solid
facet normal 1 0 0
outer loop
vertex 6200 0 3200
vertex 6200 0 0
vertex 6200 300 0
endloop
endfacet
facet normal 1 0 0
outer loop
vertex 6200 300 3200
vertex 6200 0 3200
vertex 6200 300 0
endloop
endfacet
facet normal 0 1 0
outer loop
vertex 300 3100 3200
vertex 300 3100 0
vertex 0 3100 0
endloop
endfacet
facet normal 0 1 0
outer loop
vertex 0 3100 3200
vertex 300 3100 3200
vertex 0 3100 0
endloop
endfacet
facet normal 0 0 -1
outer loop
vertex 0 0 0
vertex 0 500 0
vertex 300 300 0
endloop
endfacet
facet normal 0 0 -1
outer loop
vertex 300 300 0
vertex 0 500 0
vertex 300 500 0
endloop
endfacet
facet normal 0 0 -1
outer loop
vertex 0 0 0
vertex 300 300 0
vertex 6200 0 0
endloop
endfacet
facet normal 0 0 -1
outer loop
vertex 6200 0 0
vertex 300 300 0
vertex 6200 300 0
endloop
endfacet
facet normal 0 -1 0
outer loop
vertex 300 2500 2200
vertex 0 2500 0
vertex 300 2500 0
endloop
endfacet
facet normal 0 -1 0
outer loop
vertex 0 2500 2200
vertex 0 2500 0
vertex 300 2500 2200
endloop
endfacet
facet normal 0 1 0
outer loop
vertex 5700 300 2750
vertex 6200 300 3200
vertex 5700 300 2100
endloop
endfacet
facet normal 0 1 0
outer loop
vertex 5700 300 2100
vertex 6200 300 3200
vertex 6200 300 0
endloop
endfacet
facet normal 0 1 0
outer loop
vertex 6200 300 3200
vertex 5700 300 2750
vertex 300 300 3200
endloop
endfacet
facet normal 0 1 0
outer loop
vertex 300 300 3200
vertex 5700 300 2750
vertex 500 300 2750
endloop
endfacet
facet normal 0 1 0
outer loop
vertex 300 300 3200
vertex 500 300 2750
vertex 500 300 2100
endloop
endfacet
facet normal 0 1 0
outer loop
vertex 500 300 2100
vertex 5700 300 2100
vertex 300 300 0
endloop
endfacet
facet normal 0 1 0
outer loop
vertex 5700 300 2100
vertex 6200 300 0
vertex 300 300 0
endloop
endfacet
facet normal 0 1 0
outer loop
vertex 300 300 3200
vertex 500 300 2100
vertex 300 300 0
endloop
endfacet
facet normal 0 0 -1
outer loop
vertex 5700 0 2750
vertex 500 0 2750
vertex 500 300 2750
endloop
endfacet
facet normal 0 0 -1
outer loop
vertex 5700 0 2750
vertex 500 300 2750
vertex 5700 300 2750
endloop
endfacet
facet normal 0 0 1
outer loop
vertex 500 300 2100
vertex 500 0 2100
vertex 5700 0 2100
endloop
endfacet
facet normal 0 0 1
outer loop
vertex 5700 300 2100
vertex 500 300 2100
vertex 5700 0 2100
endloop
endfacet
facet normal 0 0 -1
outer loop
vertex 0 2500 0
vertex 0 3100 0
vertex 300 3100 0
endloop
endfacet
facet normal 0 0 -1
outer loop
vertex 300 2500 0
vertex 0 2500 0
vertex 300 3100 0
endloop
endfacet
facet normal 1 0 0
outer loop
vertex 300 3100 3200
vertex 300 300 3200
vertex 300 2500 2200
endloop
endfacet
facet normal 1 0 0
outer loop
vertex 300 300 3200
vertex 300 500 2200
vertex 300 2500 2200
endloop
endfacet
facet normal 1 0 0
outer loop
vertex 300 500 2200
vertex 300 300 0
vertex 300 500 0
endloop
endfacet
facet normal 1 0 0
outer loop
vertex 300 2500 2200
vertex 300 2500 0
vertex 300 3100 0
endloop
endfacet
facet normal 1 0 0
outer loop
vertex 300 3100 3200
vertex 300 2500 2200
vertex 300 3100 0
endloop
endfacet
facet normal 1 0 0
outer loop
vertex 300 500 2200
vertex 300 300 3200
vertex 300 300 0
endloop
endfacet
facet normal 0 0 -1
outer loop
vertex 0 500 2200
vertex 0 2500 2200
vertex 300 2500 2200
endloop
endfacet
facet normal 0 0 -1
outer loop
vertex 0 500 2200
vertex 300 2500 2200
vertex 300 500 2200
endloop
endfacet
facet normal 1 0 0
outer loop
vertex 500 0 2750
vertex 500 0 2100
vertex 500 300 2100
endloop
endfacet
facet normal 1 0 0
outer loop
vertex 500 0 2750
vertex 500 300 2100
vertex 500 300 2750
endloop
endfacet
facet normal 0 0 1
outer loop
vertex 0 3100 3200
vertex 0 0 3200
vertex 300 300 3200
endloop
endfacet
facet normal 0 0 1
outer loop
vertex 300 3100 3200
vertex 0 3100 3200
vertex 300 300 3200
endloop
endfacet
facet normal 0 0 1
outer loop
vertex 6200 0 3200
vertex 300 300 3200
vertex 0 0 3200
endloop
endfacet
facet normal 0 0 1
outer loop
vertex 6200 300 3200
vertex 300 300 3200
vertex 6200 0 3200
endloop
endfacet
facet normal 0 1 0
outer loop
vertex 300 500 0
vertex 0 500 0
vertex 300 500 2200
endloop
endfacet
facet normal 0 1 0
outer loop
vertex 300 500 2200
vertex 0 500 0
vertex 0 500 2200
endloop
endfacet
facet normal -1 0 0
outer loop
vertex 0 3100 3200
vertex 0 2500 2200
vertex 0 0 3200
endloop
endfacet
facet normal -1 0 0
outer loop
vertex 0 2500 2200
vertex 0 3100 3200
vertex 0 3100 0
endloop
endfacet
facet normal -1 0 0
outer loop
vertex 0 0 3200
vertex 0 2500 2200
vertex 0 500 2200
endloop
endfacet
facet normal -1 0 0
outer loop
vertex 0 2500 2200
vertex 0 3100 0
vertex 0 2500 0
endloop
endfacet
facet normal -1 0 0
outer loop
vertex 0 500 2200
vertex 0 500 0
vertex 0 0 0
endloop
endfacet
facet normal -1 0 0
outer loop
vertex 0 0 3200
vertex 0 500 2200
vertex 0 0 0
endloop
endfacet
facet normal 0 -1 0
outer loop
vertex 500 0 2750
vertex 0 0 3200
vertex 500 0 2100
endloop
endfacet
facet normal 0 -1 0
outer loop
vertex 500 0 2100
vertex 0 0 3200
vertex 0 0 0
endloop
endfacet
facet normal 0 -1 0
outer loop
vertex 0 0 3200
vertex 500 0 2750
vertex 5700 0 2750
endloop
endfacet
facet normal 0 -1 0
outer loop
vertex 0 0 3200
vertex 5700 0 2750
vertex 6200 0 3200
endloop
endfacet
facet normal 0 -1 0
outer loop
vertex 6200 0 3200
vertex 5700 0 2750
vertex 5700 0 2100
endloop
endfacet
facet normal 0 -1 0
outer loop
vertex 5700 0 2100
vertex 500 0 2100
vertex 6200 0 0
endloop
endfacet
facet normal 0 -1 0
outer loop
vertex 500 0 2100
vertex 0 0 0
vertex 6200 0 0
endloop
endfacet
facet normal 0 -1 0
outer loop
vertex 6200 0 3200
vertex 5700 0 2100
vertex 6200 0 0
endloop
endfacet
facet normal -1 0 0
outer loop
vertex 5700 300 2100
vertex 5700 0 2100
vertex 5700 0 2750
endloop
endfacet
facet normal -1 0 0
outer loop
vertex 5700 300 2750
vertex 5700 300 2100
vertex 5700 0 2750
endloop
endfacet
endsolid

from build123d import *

# Parameters (mm, degrees)
F1_DEPTH = 3200
F2_W     = 2000
F2_H     = 2200
F3_DEPTH = 1000
F4_W     = 5200
F4_H     = 650
F5_DEPTH = 1000


with BuildPart() as f1:
    # F0 (on Top) → F1 (new body)
    with BuildSketch(Plane.XY):
        Polygon((0, 0), (6200, 0), (6200, 300), (300, 300), (300, 3100), (0, 3100), align=None)
    extrude(amount=F1_DEPTH)

    # F2 (on face) → F3 (cut)
    with BuildSketch(Plane(origin=(0, 0, 0), x_dir=(0, -1, 0), z_dir=(-1, 0, 0))):
        with Locations((-1500, 1100)):
            Rectangle(F2_W, F2_H)
    extrude(amount=-F3_DEPTH, mode=Mode.SUBTRACT)

    # F4 (on face) → F5 (cut)
    with BuildSketch(Plane.XZ):
        with Locations((3100, 2425)):
            Rectangle(F4_W, F4_H)
    extrude(amount=-F5_DEPTH, mode=Mode.SUBTRACT)


solid = f1.part
